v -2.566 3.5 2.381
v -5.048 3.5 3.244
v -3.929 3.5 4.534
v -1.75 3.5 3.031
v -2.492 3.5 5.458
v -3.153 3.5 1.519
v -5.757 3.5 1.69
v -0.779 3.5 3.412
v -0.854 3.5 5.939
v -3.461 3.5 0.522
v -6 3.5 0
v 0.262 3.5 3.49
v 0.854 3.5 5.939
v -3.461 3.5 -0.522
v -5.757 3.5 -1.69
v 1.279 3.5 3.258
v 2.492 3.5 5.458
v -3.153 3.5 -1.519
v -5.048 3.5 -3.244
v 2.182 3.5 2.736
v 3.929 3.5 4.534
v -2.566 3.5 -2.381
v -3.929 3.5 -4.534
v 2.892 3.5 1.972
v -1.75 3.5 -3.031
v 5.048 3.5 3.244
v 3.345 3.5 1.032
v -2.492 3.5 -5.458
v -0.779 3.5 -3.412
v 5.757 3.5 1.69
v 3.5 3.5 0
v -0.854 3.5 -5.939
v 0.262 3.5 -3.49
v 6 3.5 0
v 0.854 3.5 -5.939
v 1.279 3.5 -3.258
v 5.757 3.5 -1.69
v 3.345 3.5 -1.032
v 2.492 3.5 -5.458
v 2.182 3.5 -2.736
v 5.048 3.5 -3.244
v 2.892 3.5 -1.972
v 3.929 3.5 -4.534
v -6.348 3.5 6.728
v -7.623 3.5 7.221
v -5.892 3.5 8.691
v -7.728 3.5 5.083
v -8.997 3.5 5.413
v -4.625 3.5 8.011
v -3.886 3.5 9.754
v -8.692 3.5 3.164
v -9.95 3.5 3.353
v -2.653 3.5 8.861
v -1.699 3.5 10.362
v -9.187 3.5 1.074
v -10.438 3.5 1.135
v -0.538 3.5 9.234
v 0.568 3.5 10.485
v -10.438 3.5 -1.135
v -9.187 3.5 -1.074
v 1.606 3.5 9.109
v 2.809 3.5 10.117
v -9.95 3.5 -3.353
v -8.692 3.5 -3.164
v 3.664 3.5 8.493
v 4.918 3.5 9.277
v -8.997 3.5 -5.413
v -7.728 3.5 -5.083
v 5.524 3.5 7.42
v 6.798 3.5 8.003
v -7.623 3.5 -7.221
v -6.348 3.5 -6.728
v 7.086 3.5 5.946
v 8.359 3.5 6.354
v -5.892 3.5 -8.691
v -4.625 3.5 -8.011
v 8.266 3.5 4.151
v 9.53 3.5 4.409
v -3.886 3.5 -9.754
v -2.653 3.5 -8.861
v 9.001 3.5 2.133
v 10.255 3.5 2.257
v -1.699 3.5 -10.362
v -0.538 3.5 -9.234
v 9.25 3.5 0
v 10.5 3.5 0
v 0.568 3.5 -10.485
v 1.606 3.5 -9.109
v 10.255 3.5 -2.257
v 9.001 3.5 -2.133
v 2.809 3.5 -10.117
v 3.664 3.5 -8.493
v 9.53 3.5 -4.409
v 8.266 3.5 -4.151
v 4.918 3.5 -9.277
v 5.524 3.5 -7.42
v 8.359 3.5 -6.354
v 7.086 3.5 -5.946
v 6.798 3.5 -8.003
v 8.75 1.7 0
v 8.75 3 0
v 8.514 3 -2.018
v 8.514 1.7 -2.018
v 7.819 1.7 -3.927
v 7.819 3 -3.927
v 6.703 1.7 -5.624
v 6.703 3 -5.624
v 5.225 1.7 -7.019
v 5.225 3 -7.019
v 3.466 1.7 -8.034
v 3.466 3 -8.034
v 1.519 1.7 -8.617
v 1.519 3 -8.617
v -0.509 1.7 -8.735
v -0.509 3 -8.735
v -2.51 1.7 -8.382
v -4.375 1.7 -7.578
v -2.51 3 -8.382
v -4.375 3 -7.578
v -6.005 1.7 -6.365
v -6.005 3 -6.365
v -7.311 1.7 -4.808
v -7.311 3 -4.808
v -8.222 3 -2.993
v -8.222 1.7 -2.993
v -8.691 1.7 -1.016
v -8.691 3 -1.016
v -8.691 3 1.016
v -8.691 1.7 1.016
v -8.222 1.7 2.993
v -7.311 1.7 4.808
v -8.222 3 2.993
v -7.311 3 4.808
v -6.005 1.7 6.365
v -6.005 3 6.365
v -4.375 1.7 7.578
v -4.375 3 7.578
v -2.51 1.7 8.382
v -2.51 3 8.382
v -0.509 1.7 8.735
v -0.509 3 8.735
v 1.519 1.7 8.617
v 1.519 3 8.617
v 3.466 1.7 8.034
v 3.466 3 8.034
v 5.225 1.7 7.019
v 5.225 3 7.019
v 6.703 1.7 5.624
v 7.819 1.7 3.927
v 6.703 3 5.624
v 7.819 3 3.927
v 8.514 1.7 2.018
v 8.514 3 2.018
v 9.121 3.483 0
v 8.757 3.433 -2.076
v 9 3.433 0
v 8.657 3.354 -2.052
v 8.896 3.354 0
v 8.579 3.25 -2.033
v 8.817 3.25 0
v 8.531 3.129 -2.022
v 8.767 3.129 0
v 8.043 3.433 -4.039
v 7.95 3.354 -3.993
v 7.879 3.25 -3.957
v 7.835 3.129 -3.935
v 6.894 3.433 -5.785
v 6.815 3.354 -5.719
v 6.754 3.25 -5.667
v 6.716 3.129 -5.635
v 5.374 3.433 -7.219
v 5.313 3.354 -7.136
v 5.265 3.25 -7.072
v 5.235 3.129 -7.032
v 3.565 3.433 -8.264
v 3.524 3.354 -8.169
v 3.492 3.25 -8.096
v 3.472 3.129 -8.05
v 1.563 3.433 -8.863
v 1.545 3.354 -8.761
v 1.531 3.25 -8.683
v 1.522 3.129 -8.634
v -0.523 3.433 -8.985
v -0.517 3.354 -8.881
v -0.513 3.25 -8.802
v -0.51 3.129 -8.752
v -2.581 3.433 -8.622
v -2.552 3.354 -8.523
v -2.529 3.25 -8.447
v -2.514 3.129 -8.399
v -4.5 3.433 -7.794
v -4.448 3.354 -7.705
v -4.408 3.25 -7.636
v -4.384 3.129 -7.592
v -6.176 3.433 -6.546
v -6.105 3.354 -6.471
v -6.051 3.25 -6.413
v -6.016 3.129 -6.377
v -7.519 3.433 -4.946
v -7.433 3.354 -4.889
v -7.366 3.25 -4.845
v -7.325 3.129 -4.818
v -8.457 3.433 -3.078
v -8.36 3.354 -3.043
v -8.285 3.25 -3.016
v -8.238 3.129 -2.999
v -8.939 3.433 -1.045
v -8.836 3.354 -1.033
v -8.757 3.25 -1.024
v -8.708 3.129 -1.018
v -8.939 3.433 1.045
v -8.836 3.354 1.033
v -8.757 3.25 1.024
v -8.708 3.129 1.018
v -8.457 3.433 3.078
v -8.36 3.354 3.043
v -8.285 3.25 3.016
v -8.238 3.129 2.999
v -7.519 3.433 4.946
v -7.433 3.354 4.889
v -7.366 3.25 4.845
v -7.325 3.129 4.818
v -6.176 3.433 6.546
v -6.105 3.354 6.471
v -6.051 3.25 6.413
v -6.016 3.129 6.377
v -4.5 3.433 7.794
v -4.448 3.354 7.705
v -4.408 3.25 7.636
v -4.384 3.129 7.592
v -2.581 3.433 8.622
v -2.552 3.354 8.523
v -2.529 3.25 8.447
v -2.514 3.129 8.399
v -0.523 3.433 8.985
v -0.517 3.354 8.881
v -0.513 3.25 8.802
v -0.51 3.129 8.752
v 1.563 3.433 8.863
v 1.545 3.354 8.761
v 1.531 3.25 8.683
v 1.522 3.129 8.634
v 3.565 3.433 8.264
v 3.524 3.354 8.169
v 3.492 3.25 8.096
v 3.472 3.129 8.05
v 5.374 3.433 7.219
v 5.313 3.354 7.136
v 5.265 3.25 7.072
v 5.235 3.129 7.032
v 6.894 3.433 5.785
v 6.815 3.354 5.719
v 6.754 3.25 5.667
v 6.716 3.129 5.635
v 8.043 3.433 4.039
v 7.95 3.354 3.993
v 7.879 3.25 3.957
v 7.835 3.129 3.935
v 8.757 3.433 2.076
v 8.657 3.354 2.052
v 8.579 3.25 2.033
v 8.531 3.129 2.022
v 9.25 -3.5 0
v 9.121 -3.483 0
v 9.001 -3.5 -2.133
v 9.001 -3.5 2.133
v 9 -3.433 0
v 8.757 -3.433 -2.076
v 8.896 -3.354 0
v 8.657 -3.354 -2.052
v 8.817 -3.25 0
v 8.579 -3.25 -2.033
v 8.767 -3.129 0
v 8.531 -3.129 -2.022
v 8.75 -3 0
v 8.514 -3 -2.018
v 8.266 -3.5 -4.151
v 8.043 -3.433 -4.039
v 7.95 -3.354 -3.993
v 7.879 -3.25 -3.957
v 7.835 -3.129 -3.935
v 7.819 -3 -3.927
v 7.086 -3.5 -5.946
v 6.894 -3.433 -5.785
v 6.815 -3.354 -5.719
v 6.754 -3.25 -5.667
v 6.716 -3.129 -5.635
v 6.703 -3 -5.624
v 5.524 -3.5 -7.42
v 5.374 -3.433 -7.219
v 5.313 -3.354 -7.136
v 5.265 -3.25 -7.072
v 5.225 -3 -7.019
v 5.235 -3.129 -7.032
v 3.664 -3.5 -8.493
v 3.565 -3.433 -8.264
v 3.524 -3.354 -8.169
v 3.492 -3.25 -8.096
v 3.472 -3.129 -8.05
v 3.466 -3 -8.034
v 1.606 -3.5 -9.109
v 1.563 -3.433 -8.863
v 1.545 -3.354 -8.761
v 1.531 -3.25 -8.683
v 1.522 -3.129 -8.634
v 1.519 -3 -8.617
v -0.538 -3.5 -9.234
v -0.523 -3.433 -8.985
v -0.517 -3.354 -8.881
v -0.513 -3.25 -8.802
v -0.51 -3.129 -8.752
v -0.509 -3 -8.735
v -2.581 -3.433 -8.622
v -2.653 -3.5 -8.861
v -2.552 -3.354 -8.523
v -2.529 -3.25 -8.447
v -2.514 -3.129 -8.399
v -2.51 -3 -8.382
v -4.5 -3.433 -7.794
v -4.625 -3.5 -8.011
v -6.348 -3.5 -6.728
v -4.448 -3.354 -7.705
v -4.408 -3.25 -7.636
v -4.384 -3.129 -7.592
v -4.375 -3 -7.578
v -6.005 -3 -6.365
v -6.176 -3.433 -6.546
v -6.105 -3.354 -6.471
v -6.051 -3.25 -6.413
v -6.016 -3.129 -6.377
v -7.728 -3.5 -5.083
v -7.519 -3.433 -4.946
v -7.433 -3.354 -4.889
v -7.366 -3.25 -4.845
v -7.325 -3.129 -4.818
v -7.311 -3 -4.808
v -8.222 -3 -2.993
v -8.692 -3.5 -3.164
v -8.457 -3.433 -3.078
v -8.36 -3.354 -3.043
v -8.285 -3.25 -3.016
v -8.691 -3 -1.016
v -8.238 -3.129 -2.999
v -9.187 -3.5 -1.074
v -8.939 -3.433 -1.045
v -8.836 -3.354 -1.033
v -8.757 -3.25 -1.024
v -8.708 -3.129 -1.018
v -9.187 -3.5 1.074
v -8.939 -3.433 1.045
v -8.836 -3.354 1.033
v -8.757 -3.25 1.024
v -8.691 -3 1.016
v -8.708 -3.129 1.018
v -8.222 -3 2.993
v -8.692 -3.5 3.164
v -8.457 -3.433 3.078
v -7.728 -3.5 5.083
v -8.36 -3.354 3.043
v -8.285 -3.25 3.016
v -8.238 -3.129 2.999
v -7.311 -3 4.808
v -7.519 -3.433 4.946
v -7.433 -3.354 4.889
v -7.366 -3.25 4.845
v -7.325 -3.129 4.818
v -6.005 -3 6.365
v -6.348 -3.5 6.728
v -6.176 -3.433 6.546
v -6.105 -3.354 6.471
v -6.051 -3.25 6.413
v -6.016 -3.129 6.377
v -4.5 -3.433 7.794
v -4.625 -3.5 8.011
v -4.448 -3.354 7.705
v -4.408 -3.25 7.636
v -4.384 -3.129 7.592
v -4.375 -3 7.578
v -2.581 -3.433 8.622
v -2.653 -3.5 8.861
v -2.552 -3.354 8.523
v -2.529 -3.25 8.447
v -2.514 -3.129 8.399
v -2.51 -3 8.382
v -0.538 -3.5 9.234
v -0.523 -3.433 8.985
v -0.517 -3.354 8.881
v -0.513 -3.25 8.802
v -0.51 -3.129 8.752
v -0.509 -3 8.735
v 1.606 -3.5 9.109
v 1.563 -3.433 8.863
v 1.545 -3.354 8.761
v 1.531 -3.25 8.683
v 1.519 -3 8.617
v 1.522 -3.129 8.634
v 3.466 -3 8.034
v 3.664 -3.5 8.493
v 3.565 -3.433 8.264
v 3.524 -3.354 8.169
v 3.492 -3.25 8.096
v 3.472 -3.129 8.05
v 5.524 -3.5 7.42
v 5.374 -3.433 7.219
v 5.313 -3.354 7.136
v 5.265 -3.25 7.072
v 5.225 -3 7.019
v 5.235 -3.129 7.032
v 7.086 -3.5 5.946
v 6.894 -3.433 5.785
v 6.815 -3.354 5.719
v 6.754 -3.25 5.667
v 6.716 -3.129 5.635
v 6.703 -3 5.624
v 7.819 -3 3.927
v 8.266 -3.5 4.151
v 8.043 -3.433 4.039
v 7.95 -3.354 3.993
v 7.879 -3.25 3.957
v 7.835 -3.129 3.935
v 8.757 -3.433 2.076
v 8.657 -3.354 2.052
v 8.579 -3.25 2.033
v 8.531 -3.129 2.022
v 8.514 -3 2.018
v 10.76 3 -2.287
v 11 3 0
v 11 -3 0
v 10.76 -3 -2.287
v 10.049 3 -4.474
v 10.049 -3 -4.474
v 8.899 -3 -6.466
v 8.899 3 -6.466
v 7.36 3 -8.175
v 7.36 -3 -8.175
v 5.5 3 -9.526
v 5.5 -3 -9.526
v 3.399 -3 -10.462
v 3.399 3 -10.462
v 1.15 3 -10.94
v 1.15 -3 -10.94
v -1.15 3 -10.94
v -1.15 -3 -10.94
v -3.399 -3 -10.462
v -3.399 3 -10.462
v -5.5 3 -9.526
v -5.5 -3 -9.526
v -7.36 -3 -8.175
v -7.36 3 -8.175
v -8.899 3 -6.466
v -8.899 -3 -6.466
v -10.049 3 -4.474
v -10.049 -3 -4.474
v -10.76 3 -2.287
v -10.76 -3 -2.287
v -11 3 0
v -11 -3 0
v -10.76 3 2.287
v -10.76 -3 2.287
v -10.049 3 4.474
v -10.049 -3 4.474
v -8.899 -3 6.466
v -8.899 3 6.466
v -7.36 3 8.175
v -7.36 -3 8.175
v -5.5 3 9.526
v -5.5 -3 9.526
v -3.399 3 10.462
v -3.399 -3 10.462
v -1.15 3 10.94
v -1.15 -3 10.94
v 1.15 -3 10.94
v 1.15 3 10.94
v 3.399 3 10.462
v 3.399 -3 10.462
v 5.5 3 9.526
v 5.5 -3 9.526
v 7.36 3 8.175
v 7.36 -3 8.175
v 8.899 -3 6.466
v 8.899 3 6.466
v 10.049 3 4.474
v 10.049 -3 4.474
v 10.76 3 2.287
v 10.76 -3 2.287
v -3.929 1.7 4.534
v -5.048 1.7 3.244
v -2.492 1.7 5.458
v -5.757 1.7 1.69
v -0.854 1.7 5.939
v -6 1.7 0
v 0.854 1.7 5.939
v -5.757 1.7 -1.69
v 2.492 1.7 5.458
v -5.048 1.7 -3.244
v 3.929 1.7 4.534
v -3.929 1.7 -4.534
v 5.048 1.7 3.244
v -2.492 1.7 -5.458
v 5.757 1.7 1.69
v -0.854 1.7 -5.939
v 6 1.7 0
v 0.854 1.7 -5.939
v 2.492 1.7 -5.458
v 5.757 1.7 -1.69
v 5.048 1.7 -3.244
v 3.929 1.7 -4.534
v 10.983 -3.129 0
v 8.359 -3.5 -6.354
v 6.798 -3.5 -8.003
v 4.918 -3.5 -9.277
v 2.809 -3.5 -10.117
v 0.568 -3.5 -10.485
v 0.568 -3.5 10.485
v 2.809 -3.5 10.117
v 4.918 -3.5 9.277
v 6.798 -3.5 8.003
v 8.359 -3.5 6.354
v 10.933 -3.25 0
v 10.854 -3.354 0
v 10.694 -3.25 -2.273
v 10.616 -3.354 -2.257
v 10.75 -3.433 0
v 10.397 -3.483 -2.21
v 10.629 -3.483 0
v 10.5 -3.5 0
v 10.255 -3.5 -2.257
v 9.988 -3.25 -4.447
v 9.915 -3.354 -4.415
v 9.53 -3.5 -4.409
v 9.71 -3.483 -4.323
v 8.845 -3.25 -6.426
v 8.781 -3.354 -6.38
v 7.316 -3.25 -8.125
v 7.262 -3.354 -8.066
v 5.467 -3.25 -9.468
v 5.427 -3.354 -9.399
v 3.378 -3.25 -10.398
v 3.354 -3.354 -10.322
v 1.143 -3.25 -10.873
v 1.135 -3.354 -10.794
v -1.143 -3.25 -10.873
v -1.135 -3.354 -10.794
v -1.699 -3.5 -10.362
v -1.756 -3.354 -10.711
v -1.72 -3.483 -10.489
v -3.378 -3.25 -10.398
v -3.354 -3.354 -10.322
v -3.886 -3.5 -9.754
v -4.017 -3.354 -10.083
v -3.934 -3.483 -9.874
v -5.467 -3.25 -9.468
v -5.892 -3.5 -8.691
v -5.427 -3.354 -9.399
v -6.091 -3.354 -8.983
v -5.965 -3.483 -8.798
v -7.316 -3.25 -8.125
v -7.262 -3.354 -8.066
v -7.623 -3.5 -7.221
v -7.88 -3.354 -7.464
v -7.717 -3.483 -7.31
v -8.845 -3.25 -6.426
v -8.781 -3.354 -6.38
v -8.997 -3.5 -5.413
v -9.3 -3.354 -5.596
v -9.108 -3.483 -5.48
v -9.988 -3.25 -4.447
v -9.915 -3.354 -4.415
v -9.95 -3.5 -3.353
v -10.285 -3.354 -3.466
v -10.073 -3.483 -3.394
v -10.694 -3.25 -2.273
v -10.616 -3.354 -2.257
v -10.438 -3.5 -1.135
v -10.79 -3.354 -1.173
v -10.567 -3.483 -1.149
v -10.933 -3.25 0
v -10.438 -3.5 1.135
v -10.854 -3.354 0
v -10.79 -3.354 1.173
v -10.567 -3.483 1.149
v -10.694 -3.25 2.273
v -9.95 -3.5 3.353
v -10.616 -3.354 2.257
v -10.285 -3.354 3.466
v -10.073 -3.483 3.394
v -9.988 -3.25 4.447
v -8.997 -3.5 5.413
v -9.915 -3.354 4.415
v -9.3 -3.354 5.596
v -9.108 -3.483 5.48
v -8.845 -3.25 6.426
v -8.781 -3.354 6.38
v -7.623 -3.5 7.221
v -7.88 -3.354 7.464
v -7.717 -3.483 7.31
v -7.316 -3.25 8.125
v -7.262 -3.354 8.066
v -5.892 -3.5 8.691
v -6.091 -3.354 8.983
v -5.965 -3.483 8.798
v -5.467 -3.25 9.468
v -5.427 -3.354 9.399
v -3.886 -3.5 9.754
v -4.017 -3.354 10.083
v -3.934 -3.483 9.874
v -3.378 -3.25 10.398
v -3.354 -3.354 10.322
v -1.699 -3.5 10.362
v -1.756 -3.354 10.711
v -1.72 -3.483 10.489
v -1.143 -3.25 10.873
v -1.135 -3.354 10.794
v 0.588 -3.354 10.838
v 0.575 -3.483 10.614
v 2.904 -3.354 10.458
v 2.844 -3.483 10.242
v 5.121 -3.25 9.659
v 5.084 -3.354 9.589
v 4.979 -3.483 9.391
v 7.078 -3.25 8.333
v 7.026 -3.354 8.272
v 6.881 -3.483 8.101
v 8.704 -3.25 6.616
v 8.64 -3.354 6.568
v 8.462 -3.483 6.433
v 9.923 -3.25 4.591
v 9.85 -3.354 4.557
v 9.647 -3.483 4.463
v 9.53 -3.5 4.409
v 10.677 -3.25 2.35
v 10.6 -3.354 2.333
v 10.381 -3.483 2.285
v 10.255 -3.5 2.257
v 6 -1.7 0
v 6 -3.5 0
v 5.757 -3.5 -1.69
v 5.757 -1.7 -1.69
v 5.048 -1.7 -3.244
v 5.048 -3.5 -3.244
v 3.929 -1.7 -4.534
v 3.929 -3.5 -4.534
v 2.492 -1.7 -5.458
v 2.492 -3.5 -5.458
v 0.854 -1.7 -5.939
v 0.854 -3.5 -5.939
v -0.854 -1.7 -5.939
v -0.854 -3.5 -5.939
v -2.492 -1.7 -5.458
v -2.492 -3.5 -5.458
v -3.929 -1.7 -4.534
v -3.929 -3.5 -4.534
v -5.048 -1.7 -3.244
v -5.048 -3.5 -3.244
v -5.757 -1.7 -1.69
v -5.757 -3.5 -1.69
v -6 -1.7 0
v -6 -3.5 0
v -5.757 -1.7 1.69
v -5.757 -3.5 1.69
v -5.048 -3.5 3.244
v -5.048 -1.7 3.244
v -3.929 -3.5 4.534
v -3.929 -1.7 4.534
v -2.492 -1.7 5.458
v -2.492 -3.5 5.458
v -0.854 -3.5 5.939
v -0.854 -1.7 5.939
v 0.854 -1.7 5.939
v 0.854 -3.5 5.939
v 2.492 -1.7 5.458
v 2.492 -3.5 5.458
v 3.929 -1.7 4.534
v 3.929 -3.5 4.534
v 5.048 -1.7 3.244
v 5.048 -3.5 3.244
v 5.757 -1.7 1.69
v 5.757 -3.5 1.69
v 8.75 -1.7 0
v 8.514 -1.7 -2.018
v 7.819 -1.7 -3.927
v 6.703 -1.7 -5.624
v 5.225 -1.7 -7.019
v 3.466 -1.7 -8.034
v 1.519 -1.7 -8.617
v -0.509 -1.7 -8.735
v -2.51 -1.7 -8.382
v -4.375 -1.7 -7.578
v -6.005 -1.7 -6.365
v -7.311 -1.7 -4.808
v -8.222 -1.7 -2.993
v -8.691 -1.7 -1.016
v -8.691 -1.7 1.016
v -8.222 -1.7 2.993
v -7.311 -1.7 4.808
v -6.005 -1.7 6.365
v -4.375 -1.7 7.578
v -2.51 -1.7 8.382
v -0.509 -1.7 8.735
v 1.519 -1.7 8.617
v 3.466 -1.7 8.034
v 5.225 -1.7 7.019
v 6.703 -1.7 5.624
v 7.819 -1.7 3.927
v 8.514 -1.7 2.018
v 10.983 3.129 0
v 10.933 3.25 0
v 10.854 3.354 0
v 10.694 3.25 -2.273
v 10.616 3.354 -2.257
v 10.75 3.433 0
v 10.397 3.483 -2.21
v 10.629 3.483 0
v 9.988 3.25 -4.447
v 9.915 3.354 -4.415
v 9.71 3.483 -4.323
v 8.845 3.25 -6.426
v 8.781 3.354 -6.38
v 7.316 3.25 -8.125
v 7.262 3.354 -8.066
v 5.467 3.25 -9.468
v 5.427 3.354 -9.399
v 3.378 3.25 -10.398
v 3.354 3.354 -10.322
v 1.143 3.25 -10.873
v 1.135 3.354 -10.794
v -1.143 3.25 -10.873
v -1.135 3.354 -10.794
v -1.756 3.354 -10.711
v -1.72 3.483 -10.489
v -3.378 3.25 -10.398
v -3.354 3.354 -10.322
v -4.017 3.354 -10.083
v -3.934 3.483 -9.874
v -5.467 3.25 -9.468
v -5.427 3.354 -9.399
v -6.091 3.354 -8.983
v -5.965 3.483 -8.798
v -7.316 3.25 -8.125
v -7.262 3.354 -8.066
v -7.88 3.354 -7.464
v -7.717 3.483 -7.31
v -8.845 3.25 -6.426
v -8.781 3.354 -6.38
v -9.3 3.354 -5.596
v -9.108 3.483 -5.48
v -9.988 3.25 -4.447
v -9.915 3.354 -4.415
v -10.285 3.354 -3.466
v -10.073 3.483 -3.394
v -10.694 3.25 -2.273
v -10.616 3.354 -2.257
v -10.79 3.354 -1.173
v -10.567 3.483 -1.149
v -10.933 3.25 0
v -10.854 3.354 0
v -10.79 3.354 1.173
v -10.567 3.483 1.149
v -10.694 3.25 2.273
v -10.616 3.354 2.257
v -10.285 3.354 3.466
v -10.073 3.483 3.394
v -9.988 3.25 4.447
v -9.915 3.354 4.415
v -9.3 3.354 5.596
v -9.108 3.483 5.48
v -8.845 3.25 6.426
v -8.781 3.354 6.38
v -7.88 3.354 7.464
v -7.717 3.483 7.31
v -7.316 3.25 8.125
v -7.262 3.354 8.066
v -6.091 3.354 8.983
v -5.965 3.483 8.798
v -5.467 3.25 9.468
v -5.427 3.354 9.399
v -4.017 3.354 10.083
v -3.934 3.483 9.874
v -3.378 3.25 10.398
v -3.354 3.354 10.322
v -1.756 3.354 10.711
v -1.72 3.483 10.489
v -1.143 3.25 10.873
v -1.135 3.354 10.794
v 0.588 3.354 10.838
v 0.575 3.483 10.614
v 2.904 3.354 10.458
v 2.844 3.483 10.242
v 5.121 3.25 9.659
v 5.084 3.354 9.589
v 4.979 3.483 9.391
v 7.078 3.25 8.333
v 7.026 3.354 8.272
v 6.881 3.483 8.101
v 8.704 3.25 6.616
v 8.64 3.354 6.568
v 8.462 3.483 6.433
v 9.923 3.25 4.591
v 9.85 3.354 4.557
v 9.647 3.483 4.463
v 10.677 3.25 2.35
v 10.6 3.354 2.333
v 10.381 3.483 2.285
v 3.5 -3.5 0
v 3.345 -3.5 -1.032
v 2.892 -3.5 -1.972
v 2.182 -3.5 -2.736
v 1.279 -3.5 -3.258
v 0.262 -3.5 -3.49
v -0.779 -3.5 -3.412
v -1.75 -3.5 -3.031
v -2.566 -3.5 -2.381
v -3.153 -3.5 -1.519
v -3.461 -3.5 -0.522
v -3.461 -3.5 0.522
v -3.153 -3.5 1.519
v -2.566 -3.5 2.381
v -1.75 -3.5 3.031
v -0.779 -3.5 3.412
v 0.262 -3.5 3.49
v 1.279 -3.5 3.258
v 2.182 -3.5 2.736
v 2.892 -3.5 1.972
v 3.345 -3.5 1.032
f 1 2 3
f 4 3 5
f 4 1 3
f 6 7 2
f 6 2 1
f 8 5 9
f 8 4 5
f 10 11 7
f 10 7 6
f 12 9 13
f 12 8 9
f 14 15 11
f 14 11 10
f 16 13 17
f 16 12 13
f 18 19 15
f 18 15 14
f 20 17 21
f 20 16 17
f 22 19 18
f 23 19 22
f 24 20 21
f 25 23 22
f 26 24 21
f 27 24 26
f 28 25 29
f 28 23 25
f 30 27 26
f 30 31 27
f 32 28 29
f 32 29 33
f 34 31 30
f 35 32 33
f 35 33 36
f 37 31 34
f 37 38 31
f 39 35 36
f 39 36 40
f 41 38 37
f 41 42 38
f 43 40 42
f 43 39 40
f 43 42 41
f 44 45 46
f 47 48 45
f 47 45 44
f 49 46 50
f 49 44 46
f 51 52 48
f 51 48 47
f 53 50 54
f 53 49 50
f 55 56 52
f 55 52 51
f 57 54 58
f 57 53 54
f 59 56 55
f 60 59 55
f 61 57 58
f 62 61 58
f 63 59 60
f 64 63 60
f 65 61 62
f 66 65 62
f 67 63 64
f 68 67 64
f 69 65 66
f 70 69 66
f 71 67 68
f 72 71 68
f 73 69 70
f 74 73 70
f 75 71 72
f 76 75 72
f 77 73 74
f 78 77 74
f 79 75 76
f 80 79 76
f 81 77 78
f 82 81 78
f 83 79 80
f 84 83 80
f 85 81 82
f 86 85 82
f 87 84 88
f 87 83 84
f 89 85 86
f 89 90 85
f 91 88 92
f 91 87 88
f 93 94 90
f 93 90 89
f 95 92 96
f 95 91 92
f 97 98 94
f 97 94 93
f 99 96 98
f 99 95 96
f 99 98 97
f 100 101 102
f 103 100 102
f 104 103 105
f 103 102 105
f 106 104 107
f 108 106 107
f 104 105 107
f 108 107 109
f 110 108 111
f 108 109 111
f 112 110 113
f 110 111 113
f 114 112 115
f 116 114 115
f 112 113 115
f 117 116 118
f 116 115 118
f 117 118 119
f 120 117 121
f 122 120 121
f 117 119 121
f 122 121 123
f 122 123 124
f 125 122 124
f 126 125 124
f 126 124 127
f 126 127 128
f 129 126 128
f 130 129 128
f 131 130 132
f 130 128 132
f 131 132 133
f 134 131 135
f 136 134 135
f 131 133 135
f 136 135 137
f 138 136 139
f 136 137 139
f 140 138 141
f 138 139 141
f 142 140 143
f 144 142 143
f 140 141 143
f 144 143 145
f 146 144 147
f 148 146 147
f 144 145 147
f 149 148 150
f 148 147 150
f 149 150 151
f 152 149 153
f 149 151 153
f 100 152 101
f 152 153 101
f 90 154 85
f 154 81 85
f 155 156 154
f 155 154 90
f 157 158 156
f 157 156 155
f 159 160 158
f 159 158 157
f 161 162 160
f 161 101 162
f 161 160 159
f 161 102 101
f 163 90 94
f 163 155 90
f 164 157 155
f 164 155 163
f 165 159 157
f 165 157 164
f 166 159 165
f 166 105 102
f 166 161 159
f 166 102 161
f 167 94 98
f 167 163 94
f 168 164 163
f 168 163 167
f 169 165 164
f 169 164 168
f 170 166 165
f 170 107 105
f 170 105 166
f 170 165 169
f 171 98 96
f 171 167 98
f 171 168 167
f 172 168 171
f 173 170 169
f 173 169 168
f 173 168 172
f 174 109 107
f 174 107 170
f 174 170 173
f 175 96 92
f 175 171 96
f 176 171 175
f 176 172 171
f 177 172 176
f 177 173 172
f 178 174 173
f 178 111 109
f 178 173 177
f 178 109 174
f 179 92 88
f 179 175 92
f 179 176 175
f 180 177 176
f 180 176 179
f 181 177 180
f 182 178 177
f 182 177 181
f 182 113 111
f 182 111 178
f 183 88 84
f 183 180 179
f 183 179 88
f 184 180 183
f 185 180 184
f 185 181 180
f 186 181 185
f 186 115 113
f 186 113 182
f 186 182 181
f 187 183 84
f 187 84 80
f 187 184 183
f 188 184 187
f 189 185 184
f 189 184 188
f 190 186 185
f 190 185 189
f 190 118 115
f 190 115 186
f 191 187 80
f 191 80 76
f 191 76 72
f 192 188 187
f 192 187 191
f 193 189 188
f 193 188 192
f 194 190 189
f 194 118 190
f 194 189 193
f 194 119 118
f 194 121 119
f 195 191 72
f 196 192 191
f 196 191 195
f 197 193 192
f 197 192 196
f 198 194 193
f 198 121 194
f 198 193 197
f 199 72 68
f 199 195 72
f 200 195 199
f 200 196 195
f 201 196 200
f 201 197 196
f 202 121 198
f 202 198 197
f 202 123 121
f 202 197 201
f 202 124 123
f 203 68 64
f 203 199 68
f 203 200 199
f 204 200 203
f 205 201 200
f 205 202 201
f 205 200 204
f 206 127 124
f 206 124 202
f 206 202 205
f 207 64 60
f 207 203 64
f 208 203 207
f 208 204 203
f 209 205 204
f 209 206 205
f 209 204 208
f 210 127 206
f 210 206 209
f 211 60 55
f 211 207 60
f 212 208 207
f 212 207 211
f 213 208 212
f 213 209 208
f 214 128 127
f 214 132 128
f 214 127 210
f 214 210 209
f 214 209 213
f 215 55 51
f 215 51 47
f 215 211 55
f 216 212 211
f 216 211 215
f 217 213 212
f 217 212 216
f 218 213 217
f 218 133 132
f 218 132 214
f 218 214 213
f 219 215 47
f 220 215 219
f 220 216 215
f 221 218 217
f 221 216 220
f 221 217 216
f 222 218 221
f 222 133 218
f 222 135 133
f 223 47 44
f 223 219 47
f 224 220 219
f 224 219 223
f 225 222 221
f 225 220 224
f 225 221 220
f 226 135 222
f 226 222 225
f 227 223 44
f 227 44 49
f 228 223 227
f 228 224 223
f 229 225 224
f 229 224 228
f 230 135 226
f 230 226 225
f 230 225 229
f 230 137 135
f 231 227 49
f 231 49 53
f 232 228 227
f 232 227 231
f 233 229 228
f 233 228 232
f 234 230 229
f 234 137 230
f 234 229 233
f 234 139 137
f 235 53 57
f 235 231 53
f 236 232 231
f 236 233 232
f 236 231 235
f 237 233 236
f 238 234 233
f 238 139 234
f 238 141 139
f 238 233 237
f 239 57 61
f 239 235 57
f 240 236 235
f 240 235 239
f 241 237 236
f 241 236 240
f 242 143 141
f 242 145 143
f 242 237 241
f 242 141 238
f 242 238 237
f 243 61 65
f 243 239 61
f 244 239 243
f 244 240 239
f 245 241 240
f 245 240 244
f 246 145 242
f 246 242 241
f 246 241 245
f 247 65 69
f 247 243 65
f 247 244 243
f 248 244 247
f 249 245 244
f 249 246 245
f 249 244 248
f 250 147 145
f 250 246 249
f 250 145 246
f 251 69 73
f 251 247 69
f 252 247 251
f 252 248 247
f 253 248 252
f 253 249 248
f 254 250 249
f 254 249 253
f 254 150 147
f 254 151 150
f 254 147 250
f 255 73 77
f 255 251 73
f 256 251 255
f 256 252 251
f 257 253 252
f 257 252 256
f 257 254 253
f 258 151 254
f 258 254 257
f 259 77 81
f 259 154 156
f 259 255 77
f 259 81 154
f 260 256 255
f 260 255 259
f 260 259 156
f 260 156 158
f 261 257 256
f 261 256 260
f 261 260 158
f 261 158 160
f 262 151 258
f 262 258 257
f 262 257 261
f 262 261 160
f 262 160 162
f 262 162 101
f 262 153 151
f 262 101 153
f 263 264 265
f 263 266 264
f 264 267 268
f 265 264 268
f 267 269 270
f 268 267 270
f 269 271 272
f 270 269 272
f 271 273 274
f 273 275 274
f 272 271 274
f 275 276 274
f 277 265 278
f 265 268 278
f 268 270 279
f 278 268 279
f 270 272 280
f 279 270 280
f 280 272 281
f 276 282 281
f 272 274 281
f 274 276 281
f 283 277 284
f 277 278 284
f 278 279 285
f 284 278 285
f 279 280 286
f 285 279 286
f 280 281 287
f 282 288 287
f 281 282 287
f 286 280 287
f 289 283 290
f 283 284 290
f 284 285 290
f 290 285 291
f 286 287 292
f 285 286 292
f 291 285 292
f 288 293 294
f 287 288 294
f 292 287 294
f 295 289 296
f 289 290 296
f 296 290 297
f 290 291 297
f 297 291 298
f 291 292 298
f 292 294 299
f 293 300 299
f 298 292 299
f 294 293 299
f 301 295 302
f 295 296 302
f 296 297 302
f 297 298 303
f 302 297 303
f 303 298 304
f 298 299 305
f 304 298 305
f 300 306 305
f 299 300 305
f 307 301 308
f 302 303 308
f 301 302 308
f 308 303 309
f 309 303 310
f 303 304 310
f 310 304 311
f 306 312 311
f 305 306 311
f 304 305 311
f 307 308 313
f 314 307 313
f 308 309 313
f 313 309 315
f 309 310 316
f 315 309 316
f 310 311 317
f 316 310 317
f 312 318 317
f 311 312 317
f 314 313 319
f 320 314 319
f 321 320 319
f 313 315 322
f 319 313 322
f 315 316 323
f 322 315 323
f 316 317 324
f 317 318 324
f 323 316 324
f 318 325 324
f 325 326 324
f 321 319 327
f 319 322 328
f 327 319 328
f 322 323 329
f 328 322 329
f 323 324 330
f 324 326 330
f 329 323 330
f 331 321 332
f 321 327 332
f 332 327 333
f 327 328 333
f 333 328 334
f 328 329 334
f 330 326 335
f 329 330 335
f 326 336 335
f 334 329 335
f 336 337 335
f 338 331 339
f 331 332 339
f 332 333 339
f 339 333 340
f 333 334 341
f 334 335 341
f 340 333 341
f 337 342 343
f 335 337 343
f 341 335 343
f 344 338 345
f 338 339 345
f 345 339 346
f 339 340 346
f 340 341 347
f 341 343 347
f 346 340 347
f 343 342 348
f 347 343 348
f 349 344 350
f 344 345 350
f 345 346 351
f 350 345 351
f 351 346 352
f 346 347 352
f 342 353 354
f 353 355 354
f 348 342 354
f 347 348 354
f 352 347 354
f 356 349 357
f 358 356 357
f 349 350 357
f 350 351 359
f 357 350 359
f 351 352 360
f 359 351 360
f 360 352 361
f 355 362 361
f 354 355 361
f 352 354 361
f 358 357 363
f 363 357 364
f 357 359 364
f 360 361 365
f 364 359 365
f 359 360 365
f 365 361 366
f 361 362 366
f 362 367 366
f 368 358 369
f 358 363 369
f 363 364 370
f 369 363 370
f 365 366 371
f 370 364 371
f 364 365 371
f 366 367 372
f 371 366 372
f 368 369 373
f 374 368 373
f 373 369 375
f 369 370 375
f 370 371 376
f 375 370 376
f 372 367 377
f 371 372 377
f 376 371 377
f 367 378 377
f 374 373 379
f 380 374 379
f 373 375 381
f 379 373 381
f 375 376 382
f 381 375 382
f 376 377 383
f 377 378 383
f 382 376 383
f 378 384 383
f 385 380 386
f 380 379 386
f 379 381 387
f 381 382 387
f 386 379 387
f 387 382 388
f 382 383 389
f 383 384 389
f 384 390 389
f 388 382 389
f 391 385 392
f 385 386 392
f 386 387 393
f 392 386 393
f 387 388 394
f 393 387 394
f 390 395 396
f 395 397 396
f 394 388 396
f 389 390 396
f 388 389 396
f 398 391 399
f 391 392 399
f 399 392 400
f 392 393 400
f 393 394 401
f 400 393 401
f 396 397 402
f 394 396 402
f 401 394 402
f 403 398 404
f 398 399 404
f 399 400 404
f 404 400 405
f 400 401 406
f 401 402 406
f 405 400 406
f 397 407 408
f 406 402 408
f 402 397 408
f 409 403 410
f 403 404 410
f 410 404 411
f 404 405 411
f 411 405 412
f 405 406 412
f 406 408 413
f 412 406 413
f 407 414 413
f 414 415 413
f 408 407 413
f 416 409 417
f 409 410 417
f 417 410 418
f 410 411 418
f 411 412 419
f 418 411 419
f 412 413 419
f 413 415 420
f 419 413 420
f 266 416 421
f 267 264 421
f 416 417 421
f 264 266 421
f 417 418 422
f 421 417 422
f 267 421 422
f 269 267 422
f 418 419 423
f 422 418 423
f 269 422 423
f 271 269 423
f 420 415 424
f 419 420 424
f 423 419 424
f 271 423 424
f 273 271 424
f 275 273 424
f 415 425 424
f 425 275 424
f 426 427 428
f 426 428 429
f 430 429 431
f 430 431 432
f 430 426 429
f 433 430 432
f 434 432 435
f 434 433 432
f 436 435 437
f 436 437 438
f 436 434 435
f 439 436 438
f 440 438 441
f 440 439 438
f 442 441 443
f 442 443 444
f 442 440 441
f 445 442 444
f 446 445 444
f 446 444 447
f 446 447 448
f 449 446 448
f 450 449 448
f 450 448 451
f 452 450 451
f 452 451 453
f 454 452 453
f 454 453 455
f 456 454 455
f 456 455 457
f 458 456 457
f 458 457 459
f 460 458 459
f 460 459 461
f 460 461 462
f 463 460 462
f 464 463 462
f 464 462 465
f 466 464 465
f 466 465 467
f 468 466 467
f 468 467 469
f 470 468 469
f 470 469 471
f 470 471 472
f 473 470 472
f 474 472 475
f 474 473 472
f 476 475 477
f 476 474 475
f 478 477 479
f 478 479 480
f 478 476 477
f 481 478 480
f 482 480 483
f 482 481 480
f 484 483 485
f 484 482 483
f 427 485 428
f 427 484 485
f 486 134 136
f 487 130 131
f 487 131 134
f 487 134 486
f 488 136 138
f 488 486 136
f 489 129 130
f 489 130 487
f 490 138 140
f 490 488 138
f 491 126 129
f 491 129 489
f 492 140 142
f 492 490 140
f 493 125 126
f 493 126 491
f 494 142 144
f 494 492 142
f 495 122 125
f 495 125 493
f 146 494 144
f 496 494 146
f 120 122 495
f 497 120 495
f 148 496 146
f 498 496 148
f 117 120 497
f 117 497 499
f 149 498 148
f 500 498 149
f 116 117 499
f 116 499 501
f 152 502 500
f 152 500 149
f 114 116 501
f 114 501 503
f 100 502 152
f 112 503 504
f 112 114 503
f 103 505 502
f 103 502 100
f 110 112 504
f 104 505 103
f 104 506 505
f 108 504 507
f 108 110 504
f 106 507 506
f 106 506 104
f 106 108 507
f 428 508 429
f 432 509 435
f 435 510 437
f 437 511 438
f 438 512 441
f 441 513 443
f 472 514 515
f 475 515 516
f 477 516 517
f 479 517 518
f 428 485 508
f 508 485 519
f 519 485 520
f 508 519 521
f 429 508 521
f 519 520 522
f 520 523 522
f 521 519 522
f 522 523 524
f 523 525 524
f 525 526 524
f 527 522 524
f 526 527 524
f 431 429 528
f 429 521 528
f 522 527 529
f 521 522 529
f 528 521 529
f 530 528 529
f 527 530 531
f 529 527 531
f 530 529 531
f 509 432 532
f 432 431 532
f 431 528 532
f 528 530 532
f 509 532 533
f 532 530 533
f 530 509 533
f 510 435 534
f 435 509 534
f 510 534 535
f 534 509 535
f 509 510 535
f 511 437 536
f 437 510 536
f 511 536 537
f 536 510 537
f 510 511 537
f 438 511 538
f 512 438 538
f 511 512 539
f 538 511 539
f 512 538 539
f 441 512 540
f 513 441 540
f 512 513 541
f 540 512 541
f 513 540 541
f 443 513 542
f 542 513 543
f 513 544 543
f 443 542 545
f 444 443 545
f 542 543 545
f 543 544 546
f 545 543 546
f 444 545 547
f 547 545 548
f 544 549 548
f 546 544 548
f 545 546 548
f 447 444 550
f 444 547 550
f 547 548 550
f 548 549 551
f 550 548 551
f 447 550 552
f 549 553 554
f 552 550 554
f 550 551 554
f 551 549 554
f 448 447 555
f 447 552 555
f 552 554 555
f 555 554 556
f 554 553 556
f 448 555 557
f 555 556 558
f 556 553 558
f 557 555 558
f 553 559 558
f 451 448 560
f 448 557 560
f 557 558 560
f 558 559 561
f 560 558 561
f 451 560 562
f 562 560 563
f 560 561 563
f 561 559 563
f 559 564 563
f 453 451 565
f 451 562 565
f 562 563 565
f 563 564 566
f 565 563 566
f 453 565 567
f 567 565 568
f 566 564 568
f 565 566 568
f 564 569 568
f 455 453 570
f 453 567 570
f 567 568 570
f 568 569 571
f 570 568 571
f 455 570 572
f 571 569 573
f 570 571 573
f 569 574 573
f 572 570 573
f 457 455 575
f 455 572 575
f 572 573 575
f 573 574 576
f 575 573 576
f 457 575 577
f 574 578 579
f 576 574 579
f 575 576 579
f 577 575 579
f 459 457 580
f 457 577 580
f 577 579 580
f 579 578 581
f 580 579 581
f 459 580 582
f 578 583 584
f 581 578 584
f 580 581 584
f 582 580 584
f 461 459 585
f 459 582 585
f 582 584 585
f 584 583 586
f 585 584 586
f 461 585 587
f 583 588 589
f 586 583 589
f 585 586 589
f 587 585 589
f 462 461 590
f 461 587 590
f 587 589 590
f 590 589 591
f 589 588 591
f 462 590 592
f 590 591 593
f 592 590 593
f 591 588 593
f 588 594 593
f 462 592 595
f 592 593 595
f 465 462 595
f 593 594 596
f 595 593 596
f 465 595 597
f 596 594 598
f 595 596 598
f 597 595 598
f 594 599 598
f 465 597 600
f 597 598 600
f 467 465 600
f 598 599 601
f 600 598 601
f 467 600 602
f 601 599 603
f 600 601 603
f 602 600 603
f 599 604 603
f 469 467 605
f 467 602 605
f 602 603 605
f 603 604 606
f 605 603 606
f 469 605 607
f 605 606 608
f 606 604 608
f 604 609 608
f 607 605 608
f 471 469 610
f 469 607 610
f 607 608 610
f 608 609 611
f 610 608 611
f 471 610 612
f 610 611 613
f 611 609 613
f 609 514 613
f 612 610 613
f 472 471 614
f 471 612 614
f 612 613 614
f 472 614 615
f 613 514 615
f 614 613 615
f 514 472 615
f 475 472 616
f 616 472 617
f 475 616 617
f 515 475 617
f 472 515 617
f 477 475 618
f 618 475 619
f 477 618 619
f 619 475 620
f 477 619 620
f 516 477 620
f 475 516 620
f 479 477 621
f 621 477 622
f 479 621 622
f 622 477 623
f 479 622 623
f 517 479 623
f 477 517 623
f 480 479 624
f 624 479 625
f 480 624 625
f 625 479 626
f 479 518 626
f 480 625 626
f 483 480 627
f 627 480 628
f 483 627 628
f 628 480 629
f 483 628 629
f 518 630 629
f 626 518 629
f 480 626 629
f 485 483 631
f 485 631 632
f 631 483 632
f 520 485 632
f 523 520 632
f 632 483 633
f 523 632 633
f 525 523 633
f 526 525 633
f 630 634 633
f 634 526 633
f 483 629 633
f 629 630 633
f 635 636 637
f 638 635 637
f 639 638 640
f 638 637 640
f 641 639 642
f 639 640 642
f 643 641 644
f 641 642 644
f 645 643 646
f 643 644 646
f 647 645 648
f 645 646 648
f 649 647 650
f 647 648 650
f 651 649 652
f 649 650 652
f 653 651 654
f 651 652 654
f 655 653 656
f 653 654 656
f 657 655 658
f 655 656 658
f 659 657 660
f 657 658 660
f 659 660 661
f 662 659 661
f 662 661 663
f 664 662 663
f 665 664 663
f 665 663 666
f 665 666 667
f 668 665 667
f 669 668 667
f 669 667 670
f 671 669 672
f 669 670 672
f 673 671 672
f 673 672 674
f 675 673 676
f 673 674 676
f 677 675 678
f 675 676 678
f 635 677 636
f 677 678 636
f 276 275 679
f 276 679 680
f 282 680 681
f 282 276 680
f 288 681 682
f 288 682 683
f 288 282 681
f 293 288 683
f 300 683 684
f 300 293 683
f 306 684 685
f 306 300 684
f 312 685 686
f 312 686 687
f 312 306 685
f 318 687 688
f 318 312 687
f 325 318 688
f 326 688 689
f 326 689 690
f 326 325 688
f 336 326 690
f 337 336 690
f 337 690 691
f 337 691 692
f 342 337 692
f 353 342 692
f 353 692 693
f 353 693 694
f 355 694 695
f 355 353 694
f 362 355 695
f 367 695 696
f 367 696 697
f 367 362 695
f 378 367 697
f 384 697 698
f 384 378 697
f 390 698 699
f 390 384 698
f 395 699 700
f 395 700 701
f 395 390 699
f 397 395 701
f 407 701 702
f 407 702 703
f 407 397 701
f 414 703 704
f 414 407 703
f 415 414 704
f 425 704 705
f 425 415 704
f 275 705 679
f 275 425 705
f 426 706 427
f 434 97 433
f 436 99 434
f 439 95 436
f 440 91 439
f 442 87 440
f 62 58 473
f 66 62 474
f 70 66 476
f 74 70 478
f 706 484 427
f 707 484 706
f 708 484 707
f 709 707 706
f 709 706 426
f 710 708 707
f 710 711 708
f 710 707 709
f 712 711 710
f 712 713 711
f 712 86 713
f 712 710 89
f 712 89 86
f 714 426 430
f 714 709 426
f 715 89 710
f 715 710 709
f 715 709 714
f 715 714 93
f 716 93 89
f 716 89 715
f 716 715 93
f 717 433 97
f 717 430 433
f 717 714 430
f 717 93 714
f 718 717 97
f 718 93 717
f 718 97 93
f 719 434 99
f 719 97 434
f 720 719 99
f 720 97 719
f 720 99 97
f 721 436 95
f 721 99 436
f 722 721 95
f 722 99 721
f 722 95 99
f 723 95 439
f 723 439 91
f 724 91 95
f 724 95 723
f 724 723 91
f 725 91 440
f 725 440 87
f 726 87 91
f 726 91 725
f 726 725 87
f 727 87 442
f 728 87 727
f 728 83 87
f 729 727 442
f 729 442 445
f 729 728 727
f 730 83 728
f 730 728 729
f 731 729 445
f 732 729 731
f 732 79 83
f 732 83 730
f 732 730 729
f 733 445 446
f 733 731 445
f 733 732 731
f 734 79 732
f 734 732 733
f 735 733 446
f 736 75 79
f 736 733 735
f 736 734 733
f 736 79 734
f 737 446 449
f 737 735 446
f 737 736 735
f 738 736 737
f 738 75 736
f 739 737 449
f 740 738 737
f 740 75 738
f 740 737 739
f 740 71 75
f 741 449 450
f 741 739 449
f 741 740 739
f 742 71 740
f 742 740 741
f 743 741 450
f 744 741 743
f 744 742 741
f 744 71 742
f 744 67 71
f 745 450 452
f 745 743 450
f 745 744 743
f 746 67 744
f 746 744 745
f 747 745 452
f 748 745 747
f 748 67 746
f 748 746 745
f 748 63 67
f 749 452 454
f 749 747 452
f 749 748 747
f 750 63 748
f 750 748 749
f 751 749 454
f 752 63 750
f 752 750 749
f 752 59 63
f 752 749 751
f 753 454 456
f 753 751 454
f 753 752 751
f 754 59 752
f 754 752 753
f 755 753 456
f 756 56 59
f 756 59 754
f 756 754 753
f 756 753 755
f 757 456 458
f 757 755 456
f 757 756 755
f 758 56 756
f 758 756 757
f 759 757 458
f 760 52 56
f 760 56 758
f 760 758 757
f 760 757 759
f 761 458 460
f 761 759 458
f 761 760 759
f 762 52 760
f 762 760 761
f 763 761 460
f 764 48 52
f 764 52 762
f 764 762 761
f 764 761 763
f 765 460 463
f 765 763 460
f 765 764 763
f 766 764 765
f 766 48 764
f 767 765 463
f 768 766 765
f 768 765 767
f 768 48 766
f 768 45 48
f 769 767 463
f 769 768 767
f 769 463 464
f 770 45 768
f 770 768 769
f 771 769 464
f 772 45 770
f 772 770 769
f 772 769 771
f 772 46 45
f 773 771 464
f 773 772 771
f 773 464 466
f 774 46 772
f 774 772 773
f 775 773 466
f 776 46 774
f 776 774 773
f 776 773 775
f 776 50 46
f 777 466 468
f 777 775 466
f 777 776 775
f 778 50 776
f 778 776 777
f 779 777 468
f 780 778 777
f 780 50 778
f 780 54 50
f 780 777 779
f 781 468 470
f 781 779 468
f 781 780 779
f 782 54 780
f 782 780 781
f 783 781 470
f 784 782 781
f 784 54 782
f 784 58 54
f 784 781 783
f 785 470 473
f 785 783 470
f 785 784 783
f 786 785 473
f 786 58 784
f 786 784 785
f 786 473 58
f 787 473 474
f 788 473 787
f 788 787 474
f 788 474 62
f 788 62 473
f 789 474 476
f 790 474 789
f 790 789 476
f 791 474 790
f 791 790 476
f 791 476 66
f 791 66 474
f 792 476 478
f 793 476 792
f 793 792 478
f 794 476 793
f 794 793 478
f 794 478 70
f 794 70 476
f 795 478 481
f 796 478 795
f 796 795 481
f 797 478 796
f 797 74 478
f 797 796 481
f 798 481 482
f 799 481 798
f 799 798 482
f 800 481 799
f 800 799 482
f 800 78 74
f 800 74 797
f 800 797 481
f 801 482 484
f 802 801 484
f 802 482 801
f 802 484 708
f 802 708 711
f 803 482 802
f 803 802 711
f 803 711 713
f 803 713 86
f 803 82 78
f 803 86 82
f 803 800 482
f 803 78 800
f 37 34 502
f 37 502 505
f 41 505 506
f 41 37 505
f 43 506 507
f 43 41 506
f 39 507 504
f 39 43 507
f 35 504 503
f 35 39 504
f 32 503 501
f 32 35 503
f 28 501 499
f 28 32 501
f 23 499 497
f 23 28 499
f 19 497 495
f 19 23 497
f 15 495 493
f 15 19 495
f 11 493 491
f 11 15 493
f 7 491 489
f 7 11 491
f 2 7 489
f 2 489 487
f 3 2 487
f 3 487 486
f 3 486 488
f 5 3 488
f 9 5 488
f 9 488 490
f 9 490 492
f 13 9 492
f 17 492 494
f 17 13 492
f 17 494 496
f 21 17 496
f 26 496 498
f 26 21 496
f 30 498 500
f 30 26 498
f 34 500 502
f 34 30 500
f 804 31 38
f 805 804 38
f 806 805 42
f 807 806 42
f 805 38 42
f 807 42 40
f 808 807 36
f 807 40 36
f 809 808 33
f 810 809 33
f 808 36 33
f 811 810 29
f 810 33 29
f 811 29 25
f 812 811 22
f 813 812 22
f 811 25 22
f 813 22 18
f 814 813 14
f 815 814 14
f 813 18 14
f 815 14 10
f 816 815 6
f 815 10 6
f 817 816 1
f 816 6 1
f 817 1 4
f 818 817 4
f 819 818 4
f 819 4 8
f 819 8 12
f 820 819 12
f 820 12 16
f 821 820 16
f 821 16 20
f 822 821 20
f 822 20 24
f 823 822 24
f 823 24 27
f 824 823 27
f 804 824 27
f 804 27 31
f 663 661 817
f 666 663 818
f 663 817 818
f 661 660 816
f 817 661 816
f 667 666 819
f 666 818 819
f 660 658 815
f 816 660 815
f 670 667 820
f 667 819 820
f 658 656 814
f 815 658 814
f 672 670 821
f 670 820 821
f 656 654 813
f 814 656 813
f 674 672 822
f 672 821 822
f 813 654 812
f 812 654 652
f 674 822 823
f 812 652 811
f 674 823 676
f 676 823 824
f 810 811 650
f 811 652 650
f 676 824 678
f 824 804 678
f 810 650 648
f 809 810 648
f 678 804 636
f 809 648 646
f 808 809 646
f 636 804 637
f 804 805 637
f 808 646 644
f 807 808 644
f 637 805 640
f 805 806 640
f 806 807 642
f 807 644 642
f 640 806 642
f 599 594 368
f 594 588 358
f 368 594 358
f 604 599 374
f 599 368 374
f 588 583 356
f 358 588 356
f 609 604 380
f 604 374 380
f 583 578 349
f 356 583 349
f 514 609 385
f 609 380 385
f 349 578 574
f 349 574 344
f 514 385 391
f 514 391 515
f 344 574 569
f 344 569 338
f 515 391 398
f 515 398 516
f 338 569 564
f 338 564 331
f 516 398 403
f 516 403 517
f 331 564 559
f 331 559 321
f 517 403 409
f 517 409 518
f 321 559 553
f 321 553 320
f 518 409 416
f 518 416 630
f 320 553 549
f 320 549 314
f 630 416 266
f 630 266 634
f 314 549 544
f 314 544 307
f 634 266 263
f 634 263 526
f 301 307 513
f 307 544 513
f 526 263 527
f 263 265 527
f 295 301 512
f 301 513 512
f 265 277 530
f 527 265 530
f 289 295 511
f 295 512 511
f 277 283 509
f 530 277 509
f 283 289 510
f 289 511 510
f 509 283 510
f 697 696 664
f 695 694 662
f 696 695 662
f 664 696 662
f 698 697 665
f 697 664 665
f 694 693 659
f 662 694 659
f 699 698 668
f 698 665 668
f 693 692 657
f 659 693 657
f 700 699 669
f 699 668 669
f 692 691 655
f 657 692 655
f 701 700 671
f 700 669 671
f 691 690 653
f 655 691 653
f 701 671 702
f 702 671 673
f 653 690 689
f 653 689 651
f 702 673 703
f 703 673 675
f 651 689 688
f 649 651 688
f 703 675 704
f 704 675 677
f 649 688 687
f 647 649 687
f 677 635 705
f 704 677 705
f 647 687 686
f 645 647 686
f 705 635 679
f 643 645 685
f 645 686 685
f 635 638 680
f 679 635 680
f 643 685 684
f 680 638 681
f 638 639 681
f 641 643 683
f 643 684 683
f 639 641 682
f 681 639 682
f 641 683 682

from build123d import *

# Parameters (mm, degrees)
SKETCH1_R           = 11
BOSS_EXTRUDE1_DEPTH = 3.5
SKETCH2_R           = 3.5
CUT_EXTRUDE2_DEPTH  = 8
SKETCH3_R           = 8.75
SKETCH3_R_2         = 6
CUT_EXTRUDE4_DEPTH  = 1.8
FILLET1_R           = 0.5


with BuildPart() as part:
    # Sketch1 → Boss-Extrude1 (new body, symmetric)
    with BuildSketch(Plane(origin=(0, 0, 0), x_dir=(1, 0, 0), z_dir=(0, 1, 0))):
        Circle(SKETCH1_R)
    extrude(amount=BOSS_EXTRUDE1_DEPTH, both=True)

    # Sketch2 → Cut-Extrude2 (cut, through all)
    with BuildSketch(Plane(origin=(0, 3.5, 0), x_dir=(1, 0, 0), z_dir=(0, 1, 0))):
        Circle(SKETCH2_R)
    extrude(amount=-CUT_EXTRUDE2_DEPTH, mode=Mode.SUBTRACT)

    # Sketch3 → Cut-Extrude4 (cut)
    with BuildSketch(Plane(origin=(0, 3.5, 0), x_dir=(1, 0, 0), z_dir=(0, 1, 0))):
        Circle(SKETCH3_R)
        Circle(SKETCH3_R_2, mode=Mode.SUBTRACT)
    cut_extrude4 = extrude(amount=-CUT_EXTRUDE4_DEPTH, mode=Mode.SUBTRACT)

    # Mirror1: Cut-Extrude4 across plane
    add(cut_extrude4.mirror(Plane.ZX), mode=Mode.SUBTRACT)

    # Fillet1
    fillet1_edges = [part.edges().sort_by_distance(p)[0] for p in [
        (-8.75, 3.5, 0),
        (-11, -3.5, 0),
        (-8.75, -3.5, 0),
        (-11, 3.5, 0),
    ]]
    fillet(fillet1_edges, radius=FILLET1_R)


solid = part.part
